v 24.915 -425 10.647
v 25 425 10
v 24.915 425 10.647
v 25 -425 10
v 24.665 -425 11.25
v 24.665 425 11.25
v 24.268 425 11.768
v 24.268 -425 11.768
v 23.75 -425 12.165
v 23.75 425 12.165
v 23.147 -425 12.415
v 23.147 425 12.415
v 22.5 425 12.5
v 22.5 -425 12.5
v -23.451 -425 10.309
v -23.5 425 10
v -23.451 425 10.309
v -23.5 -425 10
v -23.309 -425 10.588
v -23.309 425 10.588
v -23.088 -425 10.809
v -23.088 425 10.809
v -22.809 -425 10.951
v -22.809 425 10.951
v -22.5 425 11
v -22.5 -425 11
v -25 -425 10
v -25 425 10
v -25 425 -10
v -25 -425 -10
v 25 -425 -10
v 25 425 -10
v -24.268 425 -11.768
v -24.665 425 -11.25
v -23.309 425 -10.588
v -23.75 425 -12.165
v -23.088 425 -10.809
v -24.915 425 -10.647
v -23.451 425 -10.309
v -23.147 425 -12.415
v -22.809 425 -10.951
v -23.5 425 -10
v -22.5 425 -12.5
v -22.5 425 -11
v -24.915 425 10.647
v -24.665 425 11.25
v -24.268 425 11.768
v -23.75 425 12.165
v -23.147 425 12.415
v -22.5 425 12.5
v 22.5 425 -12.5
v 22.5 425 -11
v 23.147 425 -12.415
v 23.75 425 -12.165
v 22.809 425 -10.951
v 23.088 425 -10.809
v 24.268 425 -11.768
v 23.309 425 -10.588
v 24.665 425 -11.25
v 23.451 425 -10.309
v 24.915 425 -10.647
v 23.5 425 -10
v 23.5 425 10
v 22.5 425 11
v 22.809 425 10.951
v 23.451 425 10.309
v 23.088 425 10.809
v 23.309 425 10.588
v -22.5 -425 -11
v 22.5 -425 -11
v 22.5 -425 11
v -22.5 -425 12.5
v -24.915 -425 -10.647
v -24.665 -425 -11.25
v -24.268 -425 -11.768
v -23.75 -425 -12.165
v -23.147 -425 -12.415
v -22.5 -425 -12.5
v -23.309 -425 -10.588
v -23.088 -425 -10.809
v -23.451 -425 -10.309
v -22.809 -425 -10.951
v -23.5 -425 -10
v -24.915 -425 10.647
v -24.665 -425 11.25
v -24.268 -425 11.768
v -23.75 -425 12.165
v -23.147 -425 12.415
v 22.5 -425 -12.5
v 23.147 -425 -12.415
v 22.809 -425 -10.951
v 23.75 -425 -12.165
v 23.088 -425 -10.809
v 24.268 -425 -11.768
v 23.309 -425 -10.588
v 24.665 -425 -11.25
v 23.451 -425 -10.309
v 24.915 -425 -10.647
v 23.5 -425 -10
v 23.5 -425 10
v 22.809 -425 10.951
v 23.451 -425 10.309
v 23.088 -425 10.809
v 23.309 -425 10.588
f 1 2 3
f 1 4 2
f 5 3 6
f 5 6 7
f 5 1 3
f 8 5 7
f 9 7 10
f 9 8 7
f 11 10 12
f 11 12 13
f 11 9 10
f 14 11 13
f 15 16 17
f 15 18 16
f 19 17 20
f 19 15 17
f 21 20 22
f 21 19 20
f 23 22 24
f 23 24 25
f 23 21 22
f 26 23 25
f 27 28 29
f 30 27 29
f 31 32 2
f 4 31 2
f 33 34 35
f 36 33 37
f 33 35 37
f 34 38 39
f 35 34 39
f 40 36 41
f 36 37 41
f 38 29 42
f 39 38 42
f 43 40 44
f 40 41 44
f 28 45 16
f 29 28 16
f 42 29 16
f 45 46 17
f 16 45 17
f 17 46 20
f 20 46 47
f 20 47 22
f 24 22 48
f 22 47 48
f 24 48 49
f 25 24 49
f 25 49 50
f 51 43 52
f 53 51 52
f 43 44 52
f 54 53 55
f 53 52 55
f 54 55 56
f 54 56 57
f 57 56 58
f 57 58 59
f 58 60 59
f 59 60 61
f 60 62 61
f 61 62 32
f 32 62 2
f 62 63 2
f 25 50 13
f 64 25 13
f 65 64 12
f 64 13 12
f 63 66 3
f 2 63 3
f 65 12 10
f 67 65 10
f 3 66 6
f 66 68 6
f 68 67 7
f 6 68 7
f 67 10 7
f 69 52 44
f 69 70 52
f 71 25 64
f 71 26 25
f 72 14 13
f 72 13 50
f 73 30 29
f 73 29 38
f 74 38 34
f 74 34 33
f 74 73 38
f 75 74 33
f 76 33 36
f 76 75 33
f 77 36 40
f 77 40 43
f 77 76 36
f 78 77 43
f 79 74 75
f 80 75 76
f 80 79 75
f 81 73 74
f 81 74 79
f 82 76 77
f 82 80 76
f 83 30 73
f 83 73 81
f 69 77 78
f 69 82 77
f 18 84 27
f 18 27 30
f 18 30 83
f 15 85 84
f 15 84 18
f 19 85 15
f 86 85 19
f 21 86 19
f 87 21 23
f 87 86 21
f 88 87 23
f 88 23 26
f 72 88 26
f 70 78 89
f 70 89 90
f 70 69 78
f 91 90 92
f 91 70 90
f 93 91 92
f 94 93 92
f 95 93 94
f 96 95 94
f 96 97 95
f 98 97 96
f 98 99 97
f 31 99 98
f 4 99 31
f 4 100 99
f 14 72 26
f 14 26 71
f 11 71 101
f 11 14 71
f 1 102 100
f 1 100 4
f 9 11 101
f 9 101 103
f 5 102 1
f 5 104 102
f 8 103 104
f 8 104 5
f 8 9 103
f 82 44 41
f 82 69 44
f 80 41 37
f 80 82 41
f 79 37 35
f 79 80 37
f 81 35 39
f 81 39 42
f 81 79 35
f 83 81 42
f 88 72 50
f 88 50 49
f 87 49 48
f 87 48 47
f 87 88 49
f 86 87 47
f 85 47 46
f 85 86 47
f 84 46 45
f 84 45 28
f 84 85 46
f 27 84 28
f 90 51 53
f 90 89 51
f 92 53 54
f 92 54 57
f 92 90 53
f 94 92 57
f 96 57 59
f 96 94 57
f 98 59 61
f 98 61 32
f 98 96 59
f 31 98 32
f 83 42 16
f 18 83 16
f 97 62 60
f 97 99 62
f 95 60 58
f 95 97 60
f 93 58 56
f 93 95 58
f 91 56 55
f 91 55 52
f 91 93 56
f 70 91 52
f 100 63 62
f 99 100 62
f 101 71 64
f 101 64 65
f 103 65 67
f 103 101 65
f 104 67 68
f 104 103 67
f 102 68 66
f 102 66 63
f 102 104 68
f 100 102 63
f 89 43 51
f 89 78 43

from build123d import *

# Parameters (mm, degrees)
F1_DEPTH = 425


with BuildPart() as f1:
    # F0 (on Front) → F1 (new body, symmetric)
    with BuildSketch(Plane.XZ):
        with BuildLine():
            ThreePointArc((25, 10), (24.267766953, 11.767766953), (22.5, 12.5))
            Line((22.5, 12.5), (-22.5, 12.5))
            ThreePointArc((-22.5, 12.5), (-24.267766953, 11.767766953), (-25, 10))
            Line((-25, 10), (-25, -10))
            ThreePointArc((-25, -10), (-24.267766953, -11.767766953), (-22.5, -12.5))
            Line((-22.5, -12.5), (22.5, -12.5))
            ThreePointArc((22.5, -12.5), (24.267766953, -11.767766953), (25, -10))
            Line((25, -10), (25, 10))
        make_face()
        with BuildLine():
            ThreePointArc((22.5, 11), (23.2071067812, 10.7071067812), (23.5, 10))
            Line((23.5, 10), (23.5, -10))
            ThreePointArc((23.5, -10), (23.2071067812, -10.7071067812), (22.5, -11))
            Line((22.5, -11), (-22.5, -11))
            ThreePointArc((-22.5, -11), (-23.2071067812, -10.7071067812), (-23.5, -10))
            Line((-23.5, -10), (-23.5, 10))
            ThreePointArc((-23.5, 10), (-23.2071067812, 10.7071067812), (-22.5, 11))
            Line((-22.5, 11), (22.5, 11))
        make_face(mode=Mode.SUBTRACT)
    extrude(amount=F1_DEPTH, both=True)


solid = f1.part
